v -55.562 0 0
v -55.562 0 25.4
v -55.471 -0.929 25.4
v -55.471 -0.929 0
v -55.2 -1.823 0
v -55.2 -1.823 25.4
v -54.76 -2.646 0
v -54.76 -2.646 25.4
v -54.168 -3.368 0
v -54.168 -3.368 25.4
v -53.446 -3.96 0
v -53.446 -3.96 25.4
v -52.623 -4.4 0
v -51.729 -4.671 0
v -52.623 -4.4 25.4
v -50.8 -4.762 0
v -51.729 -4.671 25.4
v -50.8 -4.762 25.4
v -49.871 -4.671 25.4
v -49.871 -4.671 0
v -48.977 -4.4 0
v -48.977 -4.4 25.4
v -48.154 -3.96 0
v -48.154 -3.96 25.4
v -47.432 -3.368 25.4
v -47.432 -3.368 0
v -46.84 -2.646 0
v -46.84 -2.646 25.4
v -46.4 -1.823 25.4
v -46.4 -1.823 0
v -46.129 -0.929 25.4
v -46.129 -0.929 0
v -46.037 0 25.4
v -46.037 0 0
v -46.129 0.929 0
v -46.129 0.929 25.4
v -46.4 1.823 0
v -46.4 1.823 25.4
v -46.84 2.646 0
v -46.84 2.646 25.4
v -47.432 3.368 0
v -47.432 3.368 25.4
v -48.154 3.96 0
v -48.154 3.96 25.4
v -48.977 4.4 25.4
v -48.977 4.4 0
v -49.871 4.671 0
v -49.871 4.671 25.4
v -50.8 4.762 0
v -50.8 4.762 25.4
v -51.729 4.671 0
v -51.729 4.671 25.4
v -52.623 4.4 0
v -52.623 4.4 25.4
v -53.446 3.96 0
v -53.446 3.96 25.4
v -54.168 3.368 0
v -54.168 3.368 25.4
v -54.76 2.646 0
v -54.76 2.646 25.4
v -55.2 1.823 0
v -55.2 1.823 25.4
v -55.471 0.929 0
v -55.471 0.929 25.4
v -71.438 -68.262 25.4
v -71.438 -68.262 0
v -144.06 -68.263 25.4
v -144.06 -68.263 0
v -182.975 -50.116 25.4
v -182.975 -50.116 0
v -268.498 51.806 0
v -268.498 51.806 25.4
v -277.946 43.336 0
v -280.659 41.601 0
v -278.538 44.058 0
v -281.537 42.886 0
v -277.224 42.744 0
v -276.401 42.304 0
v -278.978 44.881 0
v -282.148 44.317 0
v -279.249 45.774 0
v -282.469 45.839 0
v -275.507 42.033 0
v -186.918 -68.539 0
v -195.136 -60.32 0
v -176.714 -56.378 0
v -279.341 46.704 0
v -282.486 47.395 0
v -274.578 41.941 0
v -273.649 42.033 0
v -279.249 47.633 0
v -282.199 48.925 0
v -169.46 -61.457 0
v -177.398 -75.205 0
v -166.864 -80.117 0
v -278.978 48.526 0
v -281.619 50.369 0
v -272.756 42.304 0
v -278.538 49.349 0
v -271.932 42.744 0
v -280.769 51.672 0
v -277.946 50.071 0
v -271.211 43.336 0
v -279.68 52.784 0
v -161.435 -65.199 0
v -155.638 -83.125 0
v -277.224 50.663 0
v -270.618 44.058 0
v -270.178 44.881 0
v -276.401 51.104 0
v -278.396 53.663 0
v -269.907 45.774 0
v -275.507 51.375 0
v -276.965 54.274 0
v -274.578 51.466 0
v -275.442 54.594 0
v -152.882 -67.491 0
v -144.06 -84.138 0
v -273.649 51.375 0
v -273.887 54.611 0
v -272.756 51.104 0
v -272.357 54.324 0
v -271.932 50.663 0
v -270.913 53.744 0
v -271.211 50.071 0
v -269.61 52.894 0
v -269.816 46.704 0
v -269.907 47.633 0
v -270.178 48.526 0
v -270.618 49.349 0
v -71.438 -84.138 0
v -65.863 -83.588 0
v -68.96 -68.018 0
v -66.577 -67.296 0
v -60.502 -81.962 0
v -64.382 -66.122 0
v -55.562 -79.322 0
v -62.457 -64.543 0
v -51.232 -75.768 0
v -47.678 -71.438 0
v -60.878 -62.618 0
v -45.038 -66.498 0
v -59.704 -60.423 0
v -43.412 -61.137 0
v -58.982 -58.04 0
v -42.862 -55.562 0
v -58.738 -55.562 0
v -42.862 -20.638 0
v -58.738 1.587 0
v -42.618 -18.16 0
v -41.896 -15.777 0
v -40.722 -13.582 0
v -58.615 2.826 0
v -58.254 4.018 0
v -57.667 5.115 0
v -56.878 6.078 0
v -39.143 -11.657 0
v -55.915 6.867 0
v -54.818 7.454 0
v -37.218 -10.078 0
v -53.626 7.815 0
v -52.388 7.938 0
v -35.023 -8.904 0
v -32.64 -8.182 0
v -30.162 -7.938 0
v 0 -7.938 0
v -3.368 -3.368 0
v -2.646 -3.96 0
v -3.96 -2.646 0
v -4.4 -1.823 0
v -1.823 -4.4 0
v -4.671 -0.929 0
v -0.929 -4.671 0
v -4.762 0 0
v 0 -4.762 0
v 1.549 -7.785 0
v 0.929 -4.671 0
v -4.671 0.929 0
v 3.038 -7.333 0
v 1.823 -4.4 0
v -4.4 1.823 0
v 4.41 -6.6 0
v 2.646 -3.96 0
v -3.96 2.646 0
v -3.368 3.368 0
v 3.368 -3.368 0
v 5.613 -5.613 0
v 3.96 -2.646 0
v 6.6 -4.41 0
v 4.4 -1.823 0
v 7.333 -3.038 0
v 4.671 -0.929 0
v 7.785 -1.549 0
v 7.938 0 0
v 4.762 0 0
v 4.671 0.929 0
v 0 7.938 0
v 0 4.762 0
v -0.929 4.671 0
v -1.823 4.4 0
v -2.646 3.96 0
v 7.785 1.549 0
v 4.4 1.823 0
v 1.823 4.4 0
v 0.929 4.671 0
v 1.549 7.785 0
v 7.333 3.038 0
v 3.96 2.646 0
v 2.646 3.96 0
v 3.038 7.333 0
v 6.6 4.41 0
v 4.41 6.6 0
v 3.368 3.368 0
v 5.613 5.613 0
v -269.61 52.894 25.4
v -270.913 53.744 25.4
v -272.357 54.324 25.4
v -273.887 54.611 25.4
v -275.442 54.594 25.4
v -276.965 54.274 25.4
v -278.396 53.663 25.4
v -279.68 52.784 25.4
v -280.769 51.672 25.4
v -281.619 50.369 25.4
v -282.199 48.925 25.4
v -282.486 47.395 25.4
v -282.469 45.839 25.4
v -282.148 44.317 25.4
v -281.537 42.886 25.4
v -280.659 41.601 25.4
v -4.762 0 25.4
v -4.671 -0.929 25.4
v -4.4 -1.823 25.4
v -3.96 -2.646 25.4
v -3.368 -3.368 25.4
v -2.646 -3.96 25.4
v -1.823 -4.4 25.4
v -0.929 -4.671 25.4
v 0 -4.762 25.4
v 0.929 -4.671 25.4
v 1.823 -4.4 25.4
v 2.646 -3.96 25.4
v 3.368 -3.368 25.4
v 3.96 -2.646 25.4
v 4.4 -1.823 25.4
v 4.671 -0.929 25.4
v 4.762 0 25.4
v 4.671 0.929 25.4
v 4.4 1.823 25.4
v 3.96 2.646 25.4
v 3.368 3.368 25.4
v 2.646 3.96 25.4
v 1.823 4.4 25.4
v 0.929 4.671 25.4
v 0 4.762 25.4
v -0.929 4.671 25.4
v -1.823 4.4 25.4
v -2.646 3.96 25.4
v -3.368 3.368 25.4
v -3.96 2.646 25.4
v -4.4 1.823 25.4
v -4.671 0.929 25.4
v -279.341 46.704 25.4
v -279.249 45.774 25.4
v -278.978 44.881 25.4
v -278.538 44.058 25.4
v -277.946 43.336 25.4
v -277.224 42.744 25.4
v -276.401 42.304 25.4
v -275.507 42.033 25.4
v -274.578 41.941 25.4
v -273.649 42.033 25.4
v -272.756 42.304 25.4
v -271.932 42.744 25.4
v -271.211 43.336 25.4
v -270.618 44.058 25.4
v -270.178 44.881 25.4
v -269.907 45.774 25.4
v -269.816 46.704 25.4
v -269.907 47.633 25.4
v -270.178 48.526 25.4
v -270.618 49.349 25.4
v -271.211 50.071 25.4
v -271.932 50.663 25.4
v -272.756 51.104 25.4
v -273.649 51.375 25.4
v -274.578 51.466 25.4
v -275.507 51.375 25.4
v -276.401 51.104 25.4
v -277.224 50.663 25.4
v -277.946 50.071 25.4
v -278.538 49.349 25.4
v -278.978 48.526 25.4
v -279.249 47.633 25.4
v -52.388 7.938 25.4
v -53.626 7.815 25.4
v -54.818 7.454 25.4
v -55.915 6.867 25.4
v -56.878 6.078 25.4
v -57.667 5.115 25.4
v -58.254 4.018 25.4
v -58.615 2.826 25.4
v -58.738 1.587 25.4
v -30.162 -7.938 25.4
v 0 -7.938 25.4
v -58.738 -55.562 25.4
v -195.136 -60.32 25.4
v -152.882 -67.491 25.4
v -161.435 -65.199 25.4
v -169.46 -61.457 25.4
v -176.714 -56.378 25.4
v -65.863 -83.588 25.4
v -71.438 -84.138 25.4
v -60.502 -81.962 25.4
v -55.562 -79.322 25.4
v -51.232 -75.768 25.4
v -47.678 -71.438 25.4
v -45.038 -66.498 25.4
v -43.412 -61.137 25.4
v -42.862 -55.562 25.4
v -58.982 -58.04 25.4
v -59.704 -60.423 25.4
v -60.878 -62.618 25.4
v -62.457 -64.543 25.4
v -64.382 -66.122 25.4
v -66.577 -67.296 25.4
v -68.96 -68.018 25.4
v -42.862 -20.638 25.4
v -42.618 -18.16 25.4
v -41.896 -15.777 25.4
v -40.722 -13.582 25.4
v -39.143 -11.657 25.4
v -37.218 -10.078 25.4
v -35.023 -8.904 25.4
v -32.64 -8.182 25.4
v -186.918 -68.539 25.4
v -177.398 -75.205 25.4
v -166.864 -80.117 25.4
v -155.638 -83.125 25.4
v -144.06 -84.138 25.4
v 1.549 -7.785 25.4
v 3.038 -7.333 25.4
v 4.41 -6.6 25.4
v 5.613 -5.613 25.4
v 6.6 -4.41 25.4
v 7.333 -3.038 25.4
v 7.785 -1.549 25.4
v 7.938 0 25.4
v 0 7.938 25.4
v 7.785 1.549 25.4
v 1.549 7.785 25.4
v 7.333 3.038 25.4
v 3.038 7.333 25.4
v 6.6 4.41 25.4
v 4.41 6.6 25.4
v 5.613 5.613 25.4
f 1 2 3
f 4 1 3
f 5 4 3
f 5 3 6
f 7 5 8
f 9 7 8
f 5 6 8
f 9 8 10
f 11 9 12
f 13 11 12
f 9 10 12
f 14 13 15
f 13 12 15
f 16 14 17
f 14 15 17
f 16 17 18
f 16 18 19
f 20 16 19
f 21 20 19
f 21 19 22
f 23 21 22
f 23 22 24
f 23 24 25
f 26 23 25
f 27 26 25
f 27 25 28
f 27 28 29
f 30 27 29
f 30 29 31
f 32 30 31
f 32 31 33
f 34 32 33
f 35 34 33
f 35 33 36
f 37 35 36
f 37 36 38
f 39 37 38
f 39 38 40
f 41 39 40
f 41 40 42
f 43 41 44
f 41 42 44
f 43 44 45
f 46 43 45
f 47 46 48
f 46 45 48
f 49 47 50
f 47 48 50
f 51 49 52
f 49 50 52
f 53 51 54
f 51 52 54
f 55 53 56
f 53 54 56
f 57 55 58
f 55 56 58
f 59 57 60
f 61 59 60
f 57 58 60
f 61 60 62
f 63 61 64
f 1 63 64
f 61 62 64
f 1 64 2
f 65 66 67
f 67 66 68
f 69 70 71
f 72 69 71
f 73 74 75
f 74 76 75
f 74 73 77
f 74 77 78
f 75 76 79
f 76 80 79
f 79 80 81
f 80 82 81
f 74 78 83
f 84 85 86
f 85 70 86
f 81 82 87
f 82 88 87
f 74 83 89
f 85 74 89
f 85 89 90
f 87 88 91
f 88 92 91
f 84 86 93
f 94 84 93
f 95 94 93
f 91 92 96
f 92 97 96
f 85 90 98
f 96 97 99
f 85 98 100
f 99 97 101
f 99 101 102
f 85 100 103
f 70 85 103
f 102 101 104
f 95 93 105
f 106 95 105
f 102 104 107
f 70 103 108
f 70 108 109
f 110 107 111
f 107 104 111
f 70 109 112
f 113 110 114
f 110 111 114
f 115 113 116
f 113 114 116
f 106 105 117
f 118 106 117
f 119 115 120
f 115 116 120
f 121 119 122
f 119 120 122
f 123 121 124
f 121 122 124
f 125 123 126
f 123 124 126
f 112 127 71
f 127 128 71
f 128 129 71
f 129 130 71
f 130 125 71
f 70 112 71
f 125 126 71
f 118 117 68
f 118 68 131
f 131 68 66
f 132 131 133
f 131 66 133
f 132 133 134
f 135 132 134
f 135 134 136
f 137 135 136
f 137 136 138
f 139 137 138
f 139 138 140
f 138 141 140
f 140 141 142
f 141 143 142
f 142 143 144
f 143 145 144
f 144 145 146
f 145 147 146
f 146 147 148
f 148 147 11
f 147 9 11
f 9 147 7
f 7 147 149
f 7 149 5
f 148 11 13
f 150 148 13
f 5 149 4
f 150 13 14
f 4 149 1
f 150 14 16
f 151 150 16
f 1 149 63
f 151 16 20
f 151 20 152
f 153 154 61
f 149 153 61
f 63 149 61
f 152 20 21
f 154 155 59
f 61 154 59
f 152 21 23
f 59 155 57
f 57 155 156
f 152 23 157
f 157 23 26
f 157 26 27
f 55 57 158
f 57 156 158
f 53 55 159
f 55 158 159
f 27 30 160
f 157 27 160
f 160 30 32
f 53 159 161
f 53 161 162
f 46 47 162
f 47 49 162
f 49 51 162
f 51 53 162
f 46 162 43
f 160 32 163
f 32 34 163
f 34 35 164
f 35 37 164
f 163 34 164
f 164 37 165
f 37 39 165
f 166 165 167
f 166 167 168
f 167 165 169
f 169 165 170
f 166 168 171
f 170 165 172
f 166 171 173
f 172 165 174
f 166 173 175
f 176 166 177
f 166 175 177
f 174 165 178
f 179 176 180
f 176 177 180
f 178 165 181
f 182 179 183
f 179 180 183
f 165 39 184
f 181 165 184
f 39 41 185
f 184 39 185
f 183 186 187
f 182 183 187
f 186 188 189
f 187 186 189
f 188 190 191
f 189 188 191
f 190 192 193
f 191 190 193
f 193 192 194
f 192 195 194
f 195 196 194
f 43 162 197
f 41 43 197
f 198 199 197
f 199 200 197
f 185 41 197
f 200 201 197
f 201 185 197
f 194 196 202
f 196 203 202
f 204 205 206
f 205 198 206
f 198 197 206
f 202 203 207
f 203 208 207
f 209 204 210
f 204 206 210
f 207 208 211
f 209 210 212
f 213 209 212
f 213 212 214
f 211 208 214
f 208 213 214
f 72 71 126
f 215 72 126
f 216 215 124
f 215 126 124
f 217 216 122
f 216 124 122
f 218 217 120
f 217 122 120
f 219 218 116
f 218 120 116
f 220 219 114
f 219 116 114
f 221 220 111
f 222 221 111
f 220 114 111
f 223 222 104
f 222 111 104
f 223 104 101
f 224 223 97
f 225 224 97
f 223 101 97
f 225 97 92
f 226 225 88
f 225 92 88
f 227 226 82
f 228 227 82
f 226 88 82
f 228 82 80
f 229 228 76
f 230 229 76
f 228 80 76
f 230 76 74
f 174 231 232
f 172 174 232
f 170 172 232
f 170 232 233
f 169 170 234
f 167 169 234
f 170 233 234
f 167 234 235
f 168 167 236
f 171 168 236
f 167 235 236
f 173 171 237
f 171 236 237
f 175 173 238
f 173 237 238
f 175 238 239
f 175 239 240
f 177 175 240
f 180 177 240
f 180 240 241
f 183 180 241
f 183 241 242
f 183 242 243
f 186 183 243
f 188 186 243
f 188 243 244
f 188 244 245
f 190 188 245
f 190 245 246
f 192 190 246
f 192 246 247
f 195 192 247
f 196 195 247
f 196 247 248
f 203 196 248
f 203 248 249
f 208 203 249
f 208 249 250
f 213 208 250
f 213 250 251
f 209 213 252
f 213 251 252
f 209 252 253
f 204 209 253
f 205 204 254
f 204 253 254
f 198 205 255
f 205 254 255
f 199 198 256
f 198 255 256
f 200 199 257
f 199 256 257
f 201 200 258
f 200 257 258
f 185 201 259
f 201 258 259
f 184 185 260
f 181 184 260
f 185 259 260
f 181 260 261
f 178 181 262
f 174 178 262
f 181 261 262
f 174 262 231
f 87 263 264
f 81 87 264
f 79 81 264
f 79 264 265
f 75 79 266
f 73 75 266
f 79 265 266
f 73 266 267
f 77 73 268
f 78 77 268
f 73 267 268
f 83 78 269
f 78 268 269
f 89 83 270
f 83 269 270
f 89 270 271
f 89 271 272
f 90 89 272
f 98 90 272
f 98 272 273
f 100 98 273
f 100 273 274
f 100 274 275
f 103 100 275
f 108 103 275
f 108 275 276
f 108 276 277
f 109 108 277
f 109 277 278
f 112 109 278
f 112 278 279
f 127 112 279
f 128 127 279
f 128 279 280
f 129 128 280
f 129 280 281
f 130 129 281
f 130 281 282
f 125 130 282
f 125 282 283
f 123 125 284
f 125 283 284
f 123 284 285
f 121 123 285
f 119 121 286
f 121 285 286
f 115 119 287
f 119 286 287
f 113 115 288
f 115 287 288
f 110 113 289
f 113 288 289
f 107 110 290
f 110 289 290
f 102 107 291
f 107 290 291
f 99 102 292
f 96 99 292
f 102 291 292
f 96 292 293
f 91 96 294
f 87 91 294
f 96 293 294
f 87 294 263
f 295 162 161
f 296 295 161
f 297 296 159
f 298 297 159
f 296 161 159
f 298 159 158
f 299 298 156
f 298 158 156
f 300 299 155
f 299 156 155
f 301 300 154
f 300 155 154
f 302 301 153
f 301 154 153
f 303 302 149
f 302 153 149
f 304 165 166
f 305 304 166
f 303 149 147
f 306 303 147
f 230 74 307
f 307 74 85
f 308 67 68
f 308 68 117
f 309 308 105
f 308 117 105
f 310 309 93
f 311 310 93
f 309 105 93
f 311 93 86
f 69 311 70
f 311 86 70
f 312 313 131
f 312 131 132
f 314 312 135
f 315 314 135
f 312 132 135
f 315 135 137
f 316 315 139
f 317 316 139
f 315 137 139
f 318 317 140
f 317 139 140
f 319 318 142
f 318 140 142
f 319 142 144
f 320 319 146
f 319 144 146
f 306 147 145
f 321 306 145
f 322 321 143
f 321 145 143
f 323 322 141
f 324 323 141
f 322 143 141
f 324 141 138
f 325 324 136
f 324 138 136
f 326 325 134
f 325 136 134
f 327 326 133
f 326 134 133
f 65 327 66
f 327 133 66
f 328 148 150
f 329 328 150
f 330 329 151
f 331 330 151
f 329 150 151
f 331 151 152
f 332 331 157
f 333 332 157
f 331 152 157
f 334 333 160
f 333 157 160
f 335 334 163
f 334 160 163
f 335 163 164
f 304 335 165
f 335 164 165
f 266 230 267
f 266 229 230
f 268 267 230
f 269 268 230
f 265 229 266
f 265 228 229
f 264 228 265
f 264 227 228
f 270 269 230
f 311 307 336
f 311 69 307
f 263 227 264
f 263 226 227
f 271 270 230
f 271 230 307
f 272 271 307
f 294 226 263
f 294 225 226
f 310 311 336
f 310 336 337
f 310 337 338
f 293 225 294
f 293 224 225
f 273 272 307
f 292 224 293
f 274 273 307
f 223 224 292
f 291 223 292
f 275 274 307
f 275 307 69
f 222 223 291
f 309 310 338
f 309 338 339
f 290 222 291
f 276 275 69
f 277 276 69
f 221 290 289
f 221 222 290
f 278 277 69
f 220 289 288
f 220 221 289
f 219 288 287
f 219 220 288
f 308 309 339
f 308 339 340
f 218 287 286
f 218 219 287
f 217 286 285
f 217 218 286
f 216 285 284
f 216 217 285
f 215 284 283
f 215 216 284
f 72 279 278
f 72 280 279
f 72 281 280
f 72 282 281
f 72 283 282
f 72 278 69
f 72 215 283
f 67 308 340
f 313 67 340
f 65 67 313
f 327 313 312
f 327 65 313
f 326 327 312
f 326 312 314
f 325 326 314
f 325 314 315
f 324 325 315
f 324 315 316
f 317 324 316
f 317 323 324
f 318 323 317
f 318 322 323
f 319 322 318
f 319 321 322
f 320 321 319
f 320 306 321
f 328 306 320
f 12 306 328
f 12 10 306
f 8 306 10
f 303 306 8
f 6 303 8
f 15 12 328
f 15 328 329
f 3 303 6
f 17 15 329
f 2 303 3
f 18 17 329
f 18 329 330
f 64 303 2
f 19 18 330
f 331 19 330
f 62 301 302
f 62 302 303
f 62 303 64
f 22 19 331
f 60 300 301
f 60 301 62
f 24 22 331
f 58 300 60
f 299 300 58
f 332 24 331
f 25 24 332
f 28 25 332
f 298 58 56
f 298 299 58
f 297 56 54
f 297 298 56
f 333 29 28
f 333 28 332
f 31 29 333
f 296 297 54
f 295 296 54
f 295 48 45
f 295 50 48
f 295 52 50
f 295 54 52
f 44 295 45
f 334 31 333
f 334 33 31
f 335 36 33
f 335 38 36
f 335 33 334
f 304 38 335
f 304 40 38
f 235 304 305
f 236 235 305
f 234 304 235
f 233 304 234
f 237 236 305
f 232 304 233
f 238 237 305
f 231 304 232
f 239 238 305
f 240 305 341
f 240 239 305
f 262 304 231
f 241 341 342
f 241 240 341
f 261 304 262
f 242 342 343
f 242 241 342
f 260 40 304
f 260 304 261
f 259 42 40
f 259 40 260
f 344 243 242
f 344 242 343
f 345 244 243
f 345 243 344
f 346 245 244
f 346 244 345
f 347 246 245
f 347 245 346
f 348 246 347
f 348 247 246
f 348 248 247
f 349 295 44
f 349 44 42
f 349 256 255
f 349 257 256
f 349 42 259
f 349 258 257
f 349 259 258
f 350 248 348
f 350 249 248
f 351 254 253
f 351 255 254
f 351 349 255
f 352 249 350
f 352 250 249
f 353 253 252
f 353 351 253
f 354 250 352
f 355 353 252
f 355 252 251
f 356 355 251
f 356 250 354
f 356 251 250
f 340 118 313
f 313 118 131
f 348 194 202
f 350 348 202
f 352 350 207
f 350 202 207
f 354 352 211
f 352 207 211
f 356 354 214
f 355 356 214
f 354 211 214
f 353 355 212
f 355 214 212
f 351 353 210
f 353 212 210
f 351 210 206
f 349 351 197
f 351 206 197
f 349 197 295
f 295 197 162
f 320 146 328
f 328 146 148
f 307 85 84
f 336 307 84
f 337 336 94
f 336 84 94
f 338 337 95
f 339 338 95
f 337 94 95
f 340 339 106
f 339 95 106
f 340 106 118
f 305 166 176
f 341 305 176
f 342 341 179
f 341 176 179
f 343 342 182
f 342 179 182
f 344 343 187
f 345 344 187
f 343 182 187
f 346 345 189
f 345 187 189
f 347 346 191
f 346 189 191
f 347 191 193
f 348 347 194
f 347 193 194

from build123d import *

# Parameters (mm, degrees)
F2_DEPTH = 25.4
F3_D     = 9.525


with BuildPart() as f2:
    # F1 (on Top) → F2 (new body)
    with BuildSketch(Plane.XY):
        with BuildLine():
            ThreePointArc((7.9375, 0), (5.6126600757, 5.6126600757), (0, 7.9375))
            ThreePointArc((0, 7.9375), (-7.9375, 0), (0, -7.9375))
            ThreePointArc((0, -7.9375), (5.6126600757, -5.6126600757), (7.9375, 0))
        make_face()
        with BuildLine():
            ThreePointArc((-144.0602539291, -68.2625), (-165.5292616255, -63.5029355815), (-182.9753116396, -50.1161105721))
            Line((-182.9753116396, -50.1161105721), (-268.4978463522, 51.8056774194))
            ThreePointArc((-268.4978463522, 51.8056774194), (-279.6804507713, 52.7840285348), (-280.6588018867, 41.6014241157))
            Line((-280.6588018867, 41.6014241157), (-195.1362671741, -60.3203638759))
            ThreePointArc((-195.1362671741, -60.3203638759), (-172.2383265307, -77.8905717007), (-144.0602539291, -84.1375))
            Line((-144.0602539291, -84.1375), (-71.4375, -84.1375))
            ThreePointArc((-71.4375, -84.1375), (-51.2319237276, -75.7680762724), (-42.8625, -55.5625))
            Line((-42.8625, -55.5625), (-42.8625, -20.6375))
            ThreePointArc((-42.8625, -20.6375), (-39.1427561211, -11.6572438789), (-30.1625, -7.9375))
            Line((-30.1625, -7.9375), (0, -7.9375))
            ThreePointArc((0, -7.9375), (-7.9375, 0), (0, 7.9375))
            Line((0, 7.9375), (-52.3875, 7.9375))
            ThreePointArc((-52.3875, 7.9375), (-56.8776280605, 6.0776280605), (-58.7375, 1.5875))
            Line((-58.7375, 1.5875), (-58.7375, -55.5625))
            ThreePointArc((-58.7375, -55.5625), (-62.4572438789, -64.5427561211), (-71.4375, -68.2625))
            Line((-71.4375, -68.2625), (-144.0602539291, -68.2625))
        make_face()
    extrude(amount=F2_DEPTH)

    # F3 (through all)
    with Locations(Plane(origin=(0, 0, 0), x_dir=(1, 0, 0), z_dir=(0, 0, -1))):
        with Locations((-274.5783241194, -46.7035507676), (0, 0), (-50.8, 0)):
            Hole(F3_D / 2)


solid = f2.part
